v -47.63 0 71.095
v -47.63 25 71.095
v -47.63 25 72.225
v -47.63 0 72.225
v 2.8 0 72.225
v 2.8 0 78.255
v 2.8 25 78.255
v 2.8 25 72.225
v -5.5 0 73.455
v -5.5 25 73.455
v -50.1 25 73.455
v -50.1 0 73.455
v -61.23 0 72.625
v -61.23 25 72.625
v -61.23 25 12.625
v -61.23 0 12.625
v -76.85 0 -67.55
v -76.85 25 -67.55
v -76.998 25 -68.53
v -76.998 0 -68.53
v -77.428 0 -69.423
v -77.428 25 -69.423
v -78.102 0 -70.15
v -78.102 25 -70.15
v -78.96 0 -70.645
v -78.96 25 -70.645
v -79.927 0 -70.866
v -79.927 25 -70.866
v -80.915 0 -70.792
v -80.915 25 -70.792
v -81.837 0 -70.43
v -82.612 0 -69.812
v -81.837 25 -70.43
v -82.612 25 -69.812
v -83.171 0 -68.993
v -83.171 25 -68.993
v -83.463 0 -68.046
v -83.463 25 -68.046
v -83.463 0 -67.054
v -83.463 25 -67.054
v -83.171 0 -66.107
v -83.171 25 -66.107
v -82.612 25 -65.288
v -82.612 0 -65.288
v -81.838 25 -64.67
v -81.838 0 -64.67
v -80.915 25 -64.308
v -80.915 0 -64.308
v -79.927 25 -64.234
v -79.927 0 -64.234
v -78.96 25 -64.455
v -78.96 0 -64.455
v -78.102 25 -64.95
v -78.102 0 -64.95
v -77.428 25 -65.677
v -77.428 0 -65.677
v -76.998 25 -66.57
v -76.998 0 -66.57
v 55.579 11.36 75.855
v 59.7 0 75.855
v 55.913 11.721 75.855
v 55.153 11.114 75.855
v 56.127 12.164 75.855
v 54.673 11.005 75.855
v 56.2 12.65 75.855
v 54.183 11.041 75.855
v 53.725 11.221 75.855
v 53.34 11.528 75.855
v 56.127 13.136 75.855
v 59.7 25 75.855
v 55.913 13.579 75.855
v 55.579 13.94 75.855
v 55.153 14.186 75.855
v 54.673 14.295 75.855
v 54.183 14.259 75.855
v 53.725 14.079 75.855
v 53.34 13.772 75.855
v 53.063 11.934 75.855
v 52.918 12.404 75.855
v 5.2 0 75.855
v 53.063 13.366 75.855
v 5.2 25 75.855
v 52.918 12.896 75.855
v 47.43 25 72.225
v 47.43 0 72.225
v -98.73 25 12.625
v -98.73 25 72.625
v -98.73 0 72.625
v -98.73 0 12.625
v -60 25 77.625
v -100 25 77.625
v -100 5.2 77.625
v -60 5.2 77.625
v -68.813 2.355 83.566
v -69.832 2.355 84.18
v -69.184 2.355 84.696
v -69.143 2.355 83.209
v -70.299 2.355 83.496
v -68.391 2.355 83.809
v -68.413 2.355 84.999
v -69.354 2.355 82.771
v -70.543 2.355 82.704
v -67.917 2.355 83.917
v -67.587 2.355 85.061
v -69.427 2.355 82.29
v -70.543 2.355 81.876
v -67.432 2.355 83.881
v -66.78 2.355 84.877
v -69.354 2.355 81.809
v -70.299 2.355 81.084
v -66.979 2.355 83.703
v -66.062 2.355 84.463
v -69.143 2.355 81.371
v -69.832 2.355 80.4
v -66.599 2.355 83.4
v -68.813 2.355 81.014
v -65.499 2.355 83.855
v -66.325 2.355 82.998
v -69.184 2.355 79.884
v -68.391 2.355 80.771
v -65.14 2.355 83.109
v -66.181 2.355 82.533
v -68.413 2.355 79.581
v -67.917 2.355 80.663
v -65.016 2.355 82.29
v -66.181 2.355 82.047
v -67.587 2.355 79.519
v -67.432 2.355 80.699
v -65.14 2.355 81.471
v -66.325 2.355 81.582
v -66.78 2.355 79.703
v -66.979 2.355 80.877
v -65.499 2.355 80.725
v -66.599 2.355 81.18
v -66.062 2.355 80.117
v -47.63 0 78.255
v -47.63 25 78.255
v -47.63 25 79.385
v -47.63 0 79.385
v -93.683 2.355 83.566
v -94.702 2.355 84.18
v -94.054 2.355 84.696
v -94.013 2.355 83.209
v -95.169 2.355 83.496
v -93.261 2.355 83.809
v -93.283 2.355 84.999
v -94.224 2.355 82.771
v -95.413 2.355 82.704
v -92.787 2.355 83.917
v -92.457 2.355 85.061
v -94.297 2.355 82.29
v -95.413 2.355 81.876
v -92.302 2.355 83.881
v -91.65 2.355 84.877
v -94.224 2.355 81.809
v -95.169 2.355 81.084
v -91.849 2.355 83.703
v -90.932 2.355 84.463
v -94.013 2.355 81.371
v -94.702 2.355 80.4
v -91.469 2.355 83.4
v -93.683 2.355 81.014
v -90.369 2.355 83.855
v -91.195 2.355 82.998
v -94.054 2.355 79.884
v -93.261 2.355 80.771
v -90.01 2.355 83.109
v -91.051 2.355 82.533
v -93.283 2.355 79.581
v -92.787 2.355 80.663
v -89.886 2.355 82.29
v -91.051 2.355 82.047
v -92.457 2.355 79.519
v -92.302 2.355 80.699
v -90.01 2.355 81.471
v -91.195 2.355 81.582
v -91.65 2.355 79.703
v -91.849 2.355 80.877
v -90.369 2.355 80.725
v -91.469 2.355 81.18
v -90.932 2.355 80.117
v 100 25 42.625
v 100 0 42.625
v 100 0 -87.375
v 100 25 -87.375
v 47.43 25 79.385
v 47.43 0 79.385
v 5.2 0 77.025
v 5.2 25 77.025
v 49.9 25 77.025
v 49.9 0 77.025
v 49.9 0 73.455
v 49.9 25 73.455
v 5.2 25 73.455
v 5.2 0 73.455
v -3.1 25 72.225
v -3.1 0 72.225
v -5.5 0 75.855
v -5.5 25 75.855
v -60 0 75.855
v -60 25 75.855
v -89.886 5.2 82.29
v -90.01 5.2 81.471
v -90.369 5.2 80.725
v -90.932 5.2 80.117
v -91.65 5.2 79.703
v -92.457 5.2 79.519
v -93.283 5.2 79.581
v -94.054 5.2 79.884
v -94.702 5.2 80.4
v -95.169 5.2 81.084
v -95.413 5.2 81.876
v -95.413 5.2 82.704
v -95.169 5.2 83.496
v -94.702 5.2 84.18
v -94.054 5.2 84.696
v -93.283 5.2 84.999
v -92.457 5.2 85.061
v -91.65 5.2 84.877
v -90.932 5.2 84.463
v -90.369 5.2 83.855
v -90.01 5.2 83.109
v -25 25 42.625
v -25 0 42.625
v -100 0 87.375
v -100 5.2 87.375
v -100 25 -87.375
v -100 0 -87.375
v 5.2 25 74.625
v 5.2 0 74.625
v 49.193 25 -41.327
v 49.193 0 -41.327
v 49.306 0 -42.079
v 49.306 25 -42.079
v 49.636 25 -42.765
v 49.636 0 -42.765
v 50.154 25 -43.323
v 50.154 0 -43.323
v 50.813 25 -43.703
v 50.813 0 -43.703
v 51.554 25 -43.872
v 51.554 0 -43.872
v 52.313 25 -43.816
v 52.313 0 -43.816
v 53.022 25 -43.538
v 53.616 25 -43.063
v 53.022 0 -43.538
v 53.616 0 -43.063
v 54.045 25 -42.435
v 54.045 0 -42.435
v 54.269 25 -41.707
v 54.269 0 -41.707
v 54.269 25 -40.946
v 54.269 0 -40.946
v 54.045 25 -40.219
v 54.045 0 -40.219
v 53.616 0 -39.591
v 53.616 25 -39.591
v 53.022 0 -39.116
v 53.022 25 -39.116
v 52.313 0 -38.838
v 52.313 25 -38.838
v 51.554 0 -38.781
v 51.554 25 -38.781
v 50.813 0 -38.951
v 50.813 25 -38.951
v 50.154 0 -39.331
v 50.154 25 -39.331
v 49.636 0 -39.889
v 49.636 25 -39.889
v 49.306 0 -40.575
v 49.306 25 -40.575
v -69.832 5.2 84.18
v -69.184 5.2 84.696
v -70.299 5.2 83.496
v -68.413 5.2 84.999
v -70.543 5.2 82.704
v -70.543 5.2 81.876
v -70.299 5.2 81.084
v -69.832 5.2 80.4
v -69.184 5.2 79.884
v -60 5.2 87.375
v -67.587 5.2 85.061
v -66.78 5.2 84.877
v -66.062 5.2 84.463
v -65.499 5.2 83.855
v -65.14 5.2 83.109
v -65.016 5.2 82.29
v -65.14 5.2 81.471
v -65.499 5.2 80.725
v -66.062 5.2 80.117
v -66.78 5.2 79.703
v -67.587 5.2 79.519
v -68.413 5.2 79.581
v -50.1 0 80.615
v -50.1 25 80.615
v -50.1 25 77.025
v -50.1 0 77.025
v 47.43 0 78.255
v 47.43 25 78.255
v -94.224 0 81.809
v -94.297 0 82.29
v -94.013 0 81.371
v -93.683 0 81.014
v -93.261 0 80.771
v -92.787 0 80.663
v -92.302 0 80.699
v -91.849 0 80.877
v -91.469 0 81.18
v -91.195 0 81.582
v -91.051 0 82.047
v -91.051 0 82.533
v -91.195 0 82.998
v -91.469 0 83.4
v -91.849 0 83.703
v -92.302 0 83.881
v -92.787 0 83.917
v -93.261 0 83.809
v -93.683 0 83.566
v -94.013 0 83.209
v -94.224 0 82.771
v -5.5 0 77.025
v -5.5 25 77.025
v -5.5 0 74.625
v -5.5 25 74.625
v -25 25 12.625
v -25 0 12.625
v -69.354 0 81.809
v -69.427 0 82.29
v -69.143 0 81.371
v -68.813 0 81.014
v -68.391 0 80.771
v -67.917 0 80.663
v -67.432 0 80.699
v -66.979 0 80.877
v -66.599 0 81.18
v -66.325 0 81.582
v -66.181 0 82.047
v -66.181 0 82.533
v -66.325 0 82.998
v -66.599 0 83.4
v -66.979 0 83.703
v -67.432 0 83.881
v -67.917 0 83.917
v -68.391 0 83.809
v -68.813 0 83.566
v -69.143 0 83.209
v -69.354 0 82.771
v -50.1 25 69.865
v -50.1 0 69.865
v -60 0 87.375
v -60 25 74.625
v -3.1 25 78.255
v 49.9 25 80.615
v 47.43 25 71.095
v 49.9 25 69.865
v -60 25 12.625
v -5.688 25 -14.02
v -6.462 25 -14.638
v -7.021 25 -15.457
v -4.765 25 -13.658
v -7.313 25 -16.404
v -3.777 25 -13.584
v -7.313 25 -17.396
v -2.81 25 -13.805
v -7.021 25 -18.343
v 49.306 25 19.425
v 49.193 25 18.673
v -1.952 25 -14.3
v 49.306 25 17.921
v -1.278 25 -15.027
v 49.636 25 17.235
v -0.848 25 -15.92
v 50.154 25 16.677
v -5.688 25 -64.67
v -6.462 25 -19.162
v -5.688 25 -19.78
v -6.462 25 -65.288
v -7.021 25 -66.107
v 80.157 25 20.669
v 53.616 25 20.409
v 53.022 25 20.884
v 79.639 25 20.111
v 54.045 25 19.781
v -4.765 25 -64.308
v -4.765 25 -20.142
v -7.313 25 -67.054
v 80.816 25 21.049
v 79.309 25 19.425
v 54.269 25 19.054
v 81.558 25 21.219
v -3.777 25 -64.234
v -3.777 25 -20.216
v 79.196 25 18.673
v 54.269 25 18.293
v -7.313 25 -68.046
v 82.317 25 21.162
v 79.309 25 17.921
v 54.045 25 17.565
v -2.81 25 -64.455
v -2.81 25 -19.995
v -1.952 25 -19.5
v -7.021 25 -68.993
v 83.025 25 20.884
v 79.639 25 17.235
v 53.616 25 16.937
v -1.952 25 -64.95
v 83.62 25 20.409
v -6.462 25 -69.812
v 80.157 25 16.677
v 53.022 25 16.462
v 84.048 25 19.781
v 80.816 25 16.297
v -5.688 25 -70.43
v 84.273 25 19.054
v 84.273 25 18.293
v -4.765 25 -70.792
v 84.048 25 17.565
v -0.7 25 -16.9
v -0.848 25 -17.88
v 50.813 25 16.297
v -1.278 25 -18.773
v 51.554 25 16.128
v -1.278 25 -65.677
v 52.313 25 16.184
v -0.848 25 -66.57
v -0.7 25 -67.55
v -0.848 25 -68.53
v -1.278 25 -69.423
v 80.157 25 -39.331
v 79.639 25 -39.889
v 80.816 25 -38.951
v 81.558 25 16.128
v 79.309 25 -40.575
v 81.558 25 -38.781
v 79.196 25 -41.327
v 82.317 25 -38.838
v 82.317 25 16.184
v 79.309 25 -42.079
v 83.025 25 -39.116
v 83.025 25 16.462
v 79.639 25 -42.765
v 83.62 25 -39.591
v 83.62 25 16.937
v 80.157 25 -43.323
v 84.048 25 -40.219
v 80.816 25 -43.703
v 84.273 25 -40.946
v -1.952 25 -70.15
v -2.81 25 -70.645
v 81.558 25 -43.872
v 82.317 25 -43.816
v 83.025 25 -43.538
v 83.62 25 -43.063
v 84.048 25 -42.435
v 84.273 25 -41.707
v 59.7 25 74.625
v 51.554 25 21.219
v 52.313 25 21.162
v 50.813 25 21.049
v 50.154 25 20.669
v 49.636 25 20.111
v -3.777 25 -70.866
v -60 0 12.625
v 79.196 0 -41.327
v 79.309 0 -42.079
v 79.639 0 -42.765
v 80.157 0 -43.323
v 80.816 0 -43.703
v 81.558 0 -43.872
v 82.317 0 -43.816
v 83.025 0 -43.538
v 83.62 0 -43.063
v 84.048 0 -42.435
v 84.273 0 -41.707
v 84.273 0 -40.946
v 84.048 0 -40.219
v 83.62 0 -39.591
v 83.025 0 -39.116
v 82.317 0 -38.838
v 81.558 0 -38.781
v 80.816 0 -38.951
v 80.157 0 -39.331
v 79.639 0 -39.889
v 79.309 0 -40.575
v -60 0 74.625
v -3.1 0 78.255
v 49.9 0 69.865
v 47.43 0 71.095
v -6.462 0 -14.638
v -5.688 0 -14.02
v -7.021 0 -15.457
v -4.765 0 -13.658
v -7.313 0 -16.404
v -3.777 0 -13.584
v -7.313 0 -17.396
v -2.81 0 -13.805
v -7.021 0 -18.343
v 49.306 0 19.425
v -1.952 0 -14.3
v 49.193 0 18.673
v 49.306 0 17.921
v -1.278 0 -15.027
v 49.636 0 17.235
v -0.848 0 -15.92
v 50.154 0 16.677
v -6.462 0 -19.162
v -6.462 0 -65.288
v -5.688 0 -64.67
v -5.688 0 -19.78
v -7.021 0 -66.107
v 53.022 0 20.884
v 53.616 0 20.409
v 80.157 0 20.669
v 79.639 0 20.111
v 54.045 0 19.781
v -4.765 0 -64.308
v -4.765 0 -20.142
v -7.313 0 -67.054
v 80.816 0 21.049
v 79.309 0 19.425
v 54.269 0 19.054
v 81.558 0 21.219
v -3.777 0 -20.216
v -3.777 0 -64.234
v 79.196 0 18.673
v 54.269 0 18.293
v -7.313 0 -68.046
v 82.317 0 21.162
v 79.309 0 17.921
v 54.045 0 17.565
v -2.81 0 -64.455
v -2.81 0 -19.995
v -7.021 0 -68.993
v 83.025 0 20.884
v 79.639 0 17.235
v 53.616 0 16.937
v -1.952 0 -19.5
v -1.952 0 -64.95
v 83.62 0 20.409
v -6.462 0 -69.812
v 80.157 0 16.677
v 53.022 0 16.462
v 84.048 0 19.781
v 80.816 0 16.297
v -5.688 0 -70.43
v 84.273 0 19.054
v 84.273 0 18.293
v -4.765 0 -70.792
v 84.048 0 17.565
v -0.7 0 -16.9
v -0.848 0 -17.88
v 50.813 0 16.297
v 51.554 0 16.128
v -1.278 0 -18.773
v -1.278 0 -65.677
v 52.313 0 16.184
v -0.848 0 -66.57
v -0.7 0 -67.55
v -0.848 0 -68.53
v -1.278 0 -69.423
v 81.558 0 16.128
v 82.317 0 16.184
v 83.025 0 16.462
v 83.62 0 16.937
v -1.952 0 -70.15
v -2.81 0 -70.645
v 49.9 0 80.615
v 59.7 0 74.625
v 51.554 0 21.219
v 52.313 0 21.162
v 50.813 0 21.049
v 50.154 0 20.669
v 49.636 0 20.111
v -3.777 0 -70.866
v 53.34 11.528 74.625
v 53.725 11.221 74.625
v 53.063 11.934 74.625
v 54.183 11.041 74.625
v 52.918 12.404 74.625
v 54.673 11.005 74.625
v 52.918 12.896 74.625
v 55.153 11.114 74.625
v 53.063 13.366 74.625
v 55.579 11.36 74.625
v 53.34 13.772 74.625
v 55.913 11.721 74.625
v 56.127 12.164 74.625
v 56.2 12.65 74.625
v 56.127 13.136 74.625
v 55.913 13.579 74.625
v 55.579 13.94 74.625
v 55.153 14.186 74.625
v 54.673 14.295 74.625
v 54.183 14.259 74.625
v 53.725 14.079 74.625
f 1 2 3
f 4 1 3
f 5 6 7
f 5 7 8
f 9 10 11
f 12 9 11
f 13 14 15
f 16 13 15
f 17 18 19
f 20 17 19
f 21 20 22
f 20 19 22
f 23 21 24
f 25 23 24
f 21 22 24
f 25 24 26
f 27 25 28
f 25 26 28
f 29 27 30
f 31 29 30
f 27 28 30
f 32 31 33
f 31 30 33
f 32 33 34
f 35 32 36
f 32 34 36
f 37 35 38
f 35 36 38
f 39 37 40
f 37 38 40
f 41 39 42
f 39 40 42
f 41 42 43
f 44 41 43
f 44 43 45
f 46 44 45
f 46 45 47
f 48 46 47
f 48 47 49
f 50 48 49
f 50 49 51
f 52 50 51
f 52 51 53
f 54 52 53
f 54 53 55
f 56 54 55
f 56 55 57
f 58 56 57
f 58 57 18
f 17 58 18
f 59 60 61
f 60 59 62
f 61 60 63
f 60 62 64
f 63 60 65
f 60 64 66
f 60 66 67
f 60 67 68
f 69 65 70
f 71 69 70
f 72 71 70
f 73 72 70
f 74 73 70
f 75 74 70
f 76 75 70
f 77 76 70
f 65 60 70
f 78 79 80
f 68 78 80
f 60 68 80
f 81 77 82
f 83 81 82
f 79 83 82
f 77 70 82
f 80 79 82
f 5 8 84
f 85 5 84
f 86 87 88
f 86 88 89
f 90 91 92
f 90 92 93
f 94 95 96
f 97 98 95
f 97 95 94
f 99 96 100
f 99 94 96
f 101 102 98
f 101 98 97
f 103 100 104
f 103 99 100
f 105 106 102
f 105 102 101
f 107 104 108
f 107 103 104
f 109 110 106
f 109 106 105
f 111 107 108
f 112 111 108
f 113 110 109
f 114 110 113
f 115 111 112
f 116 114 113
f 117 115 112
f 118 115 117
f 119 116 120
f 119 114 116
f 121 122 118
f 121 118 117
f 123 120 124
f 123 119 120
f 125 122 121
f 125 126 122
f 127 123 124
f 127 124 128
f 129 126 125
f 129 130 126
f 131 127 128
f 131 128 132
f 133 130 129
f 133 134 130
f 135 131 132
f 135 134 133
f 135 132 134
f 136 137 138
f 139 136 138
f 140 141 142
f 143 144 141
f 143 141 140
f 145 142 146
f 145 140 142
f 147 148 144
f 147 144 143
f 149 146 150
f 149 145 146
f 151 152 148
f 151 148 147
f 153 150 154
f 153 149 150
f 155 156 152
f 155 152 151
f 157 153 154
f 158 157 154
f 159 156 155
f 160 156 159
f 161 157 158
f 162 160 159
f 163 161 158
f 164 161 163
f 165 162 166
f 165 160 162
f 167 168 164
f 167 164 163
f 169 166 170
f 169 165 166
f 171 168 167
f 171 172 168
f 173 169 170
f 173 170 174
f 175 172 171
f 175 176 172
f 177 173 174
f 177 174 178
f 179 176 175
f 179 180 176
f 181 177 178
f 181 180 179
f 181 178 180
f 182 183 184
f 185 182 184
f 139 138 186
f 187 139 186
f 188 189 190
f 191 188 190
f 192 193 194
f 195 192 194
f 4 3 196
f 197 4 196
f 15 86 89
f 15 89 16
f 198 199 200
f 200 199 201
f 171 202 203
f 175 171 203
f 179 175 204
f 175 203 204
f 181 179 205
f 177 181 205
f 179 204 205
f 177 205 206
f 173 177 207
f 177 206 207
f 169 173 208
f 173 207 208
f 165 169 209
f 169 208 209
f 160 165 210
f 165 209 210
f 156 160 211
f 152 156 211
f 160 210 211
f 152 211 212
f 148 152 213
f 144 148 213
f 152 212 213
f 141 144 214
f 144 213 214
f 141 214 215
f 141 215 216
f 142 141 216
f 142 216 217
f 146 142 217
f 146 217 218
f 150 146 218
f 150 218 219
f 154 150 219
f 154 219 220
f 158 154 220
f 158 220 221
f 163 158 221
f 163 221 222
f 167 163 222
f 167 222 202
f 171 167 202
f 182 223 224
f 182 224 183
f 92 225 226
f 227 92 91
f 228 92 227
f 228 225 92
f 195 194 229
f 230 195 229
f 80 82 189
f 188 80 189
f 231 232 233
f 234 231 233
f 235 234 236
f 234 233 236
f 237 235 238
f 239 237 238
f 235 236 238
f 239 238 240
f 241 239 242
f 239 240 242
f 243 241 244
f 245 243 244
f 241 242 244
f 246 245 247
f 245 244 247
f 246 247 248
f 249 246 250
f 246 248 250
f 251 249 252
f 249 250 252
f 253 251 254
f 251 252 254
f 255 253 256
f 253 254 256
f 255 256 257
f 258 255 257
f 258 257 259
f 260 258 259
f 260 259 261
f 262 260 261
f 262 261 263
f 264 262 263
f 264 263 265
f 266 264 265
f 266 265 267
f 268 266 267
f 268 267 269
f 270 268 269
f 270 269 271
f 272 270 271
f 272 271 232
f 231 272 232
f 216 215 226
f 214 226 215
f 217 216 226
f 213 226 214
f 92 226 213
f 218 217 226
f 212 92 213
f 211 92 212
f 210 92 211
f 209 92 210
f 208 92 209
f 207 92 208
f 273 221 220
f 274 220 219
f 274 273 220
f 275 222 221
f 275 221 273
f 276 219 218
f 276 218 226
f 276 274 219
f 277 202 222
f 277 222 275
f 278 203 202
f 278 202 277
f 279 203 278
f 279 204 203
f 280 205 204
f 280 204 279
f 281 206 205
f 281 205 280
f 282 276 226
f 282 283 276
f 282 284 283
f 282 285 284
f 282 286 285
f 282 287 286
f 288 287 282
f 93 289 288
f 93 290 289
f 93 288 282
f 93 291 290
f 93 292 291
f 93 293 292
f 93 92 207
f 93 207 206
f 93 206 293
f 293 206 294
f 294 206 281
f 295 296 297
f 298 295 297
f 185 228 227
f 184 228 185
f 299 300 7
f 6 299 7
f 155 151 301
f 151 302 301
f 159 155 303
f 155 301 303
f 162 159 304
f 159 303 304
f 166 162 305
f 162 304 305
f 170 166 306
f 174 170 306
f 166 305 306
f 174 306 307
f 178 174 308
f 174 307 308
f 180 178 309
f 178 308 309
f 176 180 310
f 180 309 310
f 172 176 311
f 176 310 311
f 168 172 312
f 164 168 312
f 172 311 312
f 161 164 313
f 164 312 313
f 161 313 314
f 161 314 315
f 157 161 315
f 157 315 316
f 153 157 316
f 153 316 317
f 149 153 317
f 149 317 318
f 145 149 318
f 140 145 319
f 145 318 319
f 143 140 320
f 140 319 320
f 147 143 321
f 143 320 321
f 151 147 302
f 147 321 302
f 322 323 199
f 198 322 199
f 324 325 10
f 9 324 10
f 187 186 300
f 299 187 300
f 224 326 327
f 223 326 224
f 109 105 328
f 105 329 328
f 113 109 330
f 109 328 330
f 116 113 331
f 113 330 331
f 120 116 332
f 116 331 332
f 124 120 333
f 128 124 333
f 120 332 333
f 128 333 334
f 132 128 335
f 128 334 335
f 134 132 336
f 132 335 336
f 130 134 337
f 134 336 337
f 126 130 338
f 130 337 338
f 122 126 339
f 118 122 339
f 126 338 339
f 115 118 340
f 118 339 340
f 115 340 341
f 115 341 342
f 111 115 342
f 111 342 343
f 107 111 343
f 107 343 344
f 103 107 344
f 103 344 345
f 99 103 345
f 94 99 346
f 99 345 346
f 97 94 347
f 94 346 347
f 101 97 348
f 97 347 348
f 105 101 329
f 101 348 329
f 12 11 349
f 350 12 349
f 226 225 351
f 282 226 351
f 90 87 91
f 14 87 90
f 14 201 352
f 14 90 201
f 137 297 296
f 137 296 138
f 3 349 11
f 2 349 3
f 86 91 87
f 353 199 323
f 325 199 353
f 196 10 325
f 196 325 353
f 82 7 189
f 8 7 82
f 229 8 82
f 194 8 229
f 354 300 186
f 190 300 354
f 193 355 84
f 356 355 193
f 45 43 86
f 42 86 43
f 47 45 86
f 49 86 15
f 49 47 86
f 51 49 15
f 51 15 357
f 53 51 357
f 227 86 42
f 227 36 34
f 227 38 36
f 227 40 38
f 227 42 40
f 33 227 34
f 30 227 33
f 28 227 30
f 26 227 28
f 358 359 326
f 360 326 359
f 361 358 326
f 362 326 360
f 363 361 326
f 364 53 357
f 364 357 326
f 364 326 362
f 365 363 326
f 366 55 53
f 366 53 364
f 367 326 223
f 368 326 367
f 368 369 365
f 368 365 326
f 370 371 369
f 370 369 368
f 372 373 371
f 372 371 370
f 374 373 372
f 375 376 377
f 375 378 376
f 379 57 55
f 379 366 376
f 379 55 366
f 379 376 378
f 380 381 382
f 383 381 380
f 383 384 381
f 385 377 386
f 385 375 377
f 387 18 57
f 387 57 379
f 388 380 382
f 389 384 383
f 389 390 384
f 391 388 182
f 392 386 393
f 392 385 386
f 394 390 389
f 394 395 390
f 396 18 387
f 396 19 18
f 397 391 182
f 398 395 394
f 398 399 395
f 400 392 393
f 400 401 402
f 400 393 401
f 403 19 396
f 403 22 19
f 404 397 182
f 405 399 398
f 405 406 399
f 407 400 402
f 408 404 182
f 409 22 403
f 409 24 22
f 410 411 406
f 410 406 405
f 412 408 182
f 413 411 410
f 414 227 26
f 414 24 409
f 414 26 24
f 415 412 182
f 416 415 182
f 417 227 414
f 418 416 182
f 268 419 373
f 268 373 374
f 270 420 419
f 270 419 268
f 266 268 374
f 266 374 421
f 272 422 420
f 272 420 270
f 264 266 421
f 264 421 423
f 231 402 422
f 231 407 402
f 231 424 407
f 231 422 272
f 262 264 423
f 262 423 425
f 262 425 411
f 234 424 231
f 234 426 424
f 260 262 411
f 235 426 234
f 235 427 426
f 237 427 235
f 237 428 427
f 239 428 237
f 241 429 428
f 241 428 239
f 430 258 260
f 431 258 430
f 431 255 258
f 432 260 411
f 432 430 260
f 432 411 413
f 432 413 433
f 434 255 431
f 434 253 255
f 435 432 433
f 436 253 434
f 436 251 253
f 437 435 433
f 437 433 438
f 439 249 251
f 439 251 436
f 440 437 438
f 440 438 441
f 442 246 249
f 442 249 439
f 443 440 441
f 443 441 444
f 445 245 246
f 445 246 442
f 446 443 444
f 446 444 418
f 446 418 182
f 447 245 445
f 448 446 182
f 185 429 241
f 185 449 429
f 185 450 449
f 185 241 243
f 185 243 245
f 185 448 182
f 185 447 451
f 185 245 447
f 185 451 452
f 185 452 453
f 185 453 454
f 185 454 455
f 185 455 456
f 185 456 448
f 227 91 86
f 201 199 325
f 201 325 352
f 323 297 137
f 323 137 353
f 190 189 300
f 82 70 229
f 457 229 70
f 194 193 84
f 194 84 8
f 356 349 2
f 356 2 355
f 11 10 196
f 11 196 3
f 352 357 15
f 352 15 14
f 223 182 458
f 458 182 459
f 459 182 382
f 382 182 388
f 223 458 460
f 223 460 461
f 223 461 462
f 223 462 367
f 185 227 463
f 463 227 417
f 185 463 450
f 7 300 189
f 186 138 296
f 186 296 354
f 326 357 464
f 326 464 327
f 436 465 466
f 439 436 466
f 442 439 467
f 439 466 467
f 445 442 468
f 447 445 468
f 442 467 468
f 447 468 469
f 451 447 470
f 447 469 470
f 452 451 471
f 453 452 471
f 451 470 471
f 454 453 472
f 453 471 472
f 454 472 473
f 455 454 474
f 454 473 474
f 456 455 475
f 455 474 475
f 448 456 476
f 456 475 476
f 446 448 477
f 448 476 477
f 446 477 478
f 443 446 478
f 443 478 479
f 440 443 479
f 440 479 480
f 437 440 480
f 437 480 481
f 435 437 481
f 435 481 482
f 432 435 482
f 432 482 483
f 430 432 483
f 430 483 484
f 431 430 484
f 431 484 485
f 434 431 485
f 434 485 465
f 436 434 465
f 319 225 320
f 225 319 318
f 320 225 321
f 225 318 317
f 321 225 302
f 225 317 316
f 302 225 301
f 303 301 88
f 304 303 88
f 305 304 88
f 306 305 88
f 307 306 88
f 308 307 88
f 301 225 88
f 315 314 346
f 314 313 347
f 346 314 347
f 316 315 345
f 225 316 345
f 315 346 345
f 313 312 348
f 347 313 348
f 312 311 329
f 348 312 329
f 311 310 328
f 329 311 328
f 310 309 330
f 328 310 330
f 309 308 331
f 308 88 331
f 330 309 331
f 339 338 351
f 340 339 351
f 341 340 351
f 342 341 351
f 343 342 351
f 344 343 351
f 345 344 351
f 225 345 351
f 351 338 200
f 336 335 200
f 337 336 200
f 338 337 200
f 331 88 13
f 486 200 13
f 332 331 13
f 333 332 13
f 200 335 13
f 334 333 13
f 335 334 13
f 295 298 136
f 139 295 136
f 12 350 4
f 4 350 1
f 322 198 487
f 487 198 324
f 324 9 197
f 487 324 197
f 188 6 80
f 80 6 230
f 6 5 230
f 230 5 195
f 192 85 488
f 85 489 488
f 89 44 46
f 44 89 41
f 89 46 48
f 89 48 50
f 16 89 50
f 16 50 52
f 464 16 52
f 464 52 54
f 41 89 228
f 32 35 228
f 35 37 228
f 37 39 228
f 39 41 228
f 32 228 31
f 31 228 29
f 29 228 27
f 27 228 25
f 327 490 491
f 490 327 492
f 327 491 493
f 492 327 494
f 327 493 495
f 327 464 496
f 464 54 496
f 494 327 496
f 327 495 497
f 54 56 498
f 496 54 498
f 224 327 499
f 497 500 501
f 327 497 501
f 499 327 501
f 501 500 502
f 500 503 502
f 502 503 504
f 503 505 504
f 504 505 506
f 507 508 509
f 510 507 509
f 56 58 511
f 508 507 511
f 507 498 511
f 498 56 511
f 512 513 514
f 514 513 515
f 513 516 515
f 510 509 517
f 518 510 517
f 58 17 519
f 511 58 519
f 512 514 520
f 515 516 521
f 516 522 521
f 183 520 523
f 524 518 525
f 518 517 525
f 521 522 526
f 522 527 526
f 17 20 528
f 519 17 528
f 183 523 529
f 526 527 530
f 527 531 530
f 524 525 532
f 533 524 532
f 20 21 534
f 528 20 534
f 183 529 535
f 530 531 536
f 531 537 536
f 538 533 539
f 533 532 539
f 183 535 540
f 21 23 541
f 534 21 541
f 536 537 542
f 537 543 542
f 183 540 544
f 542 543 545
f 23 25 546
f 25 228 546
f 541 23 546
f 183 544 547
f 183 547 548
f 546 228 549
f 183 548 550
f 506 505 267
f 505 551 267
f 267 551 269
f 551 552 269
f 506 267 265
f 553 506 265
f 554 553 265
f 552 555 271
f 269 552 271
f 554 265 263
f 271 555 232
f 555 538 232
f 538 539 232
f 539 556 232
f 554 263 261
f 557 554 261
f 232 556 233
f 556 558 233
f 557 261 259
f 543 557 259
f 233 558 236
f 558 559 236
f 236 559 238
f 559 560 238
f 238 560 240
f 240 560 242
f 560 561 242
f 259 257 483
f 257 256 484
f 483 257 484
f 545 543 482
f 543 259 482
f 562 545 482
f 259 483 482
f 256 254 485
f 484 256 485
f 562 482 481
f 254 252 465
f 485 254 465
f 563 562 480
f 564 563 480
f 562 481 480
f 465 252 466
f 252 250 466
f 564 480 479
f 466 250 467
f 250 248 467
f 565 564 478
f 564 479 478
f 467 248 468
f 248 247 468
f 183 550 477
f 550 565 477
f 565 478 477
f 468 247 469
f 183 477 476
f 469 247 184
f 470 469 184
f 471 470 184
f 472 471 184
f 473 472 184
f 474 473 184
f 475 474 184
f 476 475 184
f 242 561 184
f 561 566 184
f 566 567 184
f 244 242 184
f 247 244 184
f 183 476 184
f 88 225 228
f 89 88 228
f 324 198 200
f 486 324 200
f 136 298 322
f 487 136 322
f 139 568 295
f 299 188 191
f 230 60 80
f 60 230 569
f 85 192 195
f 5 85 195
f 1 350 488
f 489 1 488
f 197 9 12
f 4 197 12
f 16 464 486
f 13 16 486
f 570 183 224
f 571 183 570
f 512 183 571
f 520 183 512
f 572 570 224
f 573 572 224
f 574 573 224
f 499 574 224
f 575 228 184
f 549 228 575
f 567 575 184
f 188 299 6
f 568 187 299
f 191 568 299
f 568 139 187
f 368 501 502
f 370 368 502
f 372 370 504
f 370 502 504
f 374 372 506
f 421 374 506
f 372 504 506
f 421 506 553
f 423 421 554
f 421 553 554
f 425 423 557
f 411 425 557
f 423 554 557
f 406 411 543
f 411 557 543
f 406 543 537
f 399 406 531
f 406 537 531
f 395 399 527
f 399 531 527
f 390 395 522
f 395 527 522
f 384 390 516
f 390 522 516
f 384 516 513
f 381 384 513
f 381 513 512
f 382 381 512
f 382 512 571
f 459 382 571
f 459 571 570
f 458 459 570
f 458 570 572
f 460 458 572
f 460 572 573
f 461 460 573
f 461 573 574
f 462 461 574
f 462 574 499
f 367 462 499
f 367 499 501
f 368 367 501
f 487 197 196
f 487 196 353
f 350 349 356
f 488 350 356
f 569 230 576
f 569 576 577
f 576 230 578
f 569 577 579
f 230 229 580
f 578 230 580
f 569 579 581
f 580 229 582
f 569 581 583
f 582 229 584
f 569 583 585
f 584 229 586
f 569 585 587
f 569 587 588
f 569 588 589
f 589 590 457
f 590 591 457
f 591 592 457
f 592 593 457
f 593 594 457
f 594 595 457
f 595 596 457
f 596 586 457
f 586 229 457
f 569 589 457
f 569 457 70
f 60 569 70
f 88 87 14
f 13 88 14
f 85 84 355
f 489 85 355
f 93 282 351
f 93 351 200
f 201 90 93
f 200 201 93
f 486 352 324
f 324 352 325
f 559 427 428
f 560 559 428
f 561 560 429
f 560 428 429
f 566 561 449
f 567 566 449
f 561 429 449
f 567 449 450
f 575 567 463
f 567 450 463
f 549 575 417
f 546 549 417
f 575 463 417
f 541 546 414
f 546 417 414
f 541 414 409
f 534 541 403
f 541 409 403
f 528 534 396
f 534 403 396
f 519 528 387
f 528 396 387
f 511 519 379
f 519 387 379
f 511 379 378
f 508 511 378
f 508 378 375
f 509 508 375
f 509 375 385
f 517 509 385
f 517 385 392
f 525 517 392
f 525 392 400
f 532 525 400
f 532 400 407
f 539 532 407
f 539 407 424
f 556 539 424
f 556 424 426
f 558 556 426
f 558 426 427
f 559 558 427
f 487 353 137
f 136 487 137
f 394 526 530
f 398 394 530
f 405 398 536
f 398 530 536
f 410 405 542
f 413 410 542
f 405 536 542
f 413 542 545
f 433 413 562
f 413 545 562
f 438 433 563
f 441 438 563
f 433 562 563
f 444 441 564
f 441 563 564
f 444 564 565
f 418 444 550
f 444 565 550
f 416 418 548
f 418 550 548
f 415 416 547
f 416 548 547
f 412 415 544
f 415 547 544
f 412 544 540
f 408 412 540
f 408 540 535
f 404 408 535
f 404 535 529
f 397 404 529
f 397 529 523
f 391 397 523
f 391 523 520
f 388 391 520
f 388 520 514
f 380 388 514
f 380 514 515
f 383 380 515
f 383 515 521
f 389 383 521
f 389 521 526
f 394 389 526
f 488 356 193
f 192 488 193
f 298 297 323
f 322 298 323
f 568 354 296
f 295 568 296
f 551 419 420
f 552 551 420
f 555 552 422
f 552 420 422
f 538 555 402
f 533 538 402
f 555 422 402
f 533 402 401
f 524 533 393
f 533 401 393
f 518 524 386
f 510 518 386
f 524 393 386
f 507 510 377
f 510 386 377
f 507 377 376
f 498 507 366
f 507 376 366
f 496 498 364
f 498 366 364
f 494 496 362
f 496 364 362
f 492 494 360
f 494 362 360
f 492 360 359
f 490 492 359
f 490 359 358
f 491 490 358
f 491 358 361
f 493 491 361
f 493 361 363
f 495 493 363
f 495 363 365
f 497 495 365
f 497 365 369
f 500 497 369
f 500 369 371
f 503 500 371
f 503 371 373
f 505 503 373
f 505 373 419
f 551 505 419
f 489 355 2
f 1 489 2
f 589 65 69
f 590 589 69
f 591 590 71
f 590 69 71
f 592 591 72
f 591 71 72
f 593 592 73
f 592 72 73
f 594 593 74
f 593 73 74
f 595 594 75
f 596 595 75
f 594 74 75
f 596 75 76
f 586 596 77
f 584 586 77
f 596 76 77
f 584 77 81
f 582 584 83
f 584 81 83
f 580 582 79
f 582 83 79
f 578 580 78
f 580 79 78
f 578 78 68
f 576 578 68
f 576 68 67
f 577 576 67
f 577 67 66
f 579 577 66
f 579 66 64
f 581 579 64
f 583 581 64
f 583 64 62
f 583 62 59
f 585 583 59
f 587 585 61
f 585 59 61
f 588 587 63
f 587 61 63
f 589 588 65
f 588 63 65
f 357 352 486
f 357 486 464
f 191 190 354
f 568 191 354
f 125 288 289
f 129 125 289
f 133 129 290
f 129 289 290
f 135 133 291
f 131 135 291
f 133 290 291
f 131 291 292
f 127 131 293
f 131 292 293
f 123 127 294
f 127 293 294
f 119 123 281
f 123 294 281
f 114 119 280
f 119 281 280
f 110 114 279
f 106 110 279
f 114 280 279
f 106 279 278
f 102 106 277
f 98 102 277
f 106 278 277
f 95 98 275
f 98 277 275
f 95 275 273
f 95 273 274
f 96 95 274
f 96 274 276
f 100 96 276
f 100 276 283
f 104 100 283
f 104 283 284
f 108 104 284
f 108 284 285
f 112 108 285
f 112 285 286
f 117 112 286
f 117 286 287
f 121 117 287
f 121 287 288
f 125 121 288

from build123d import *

# Parameters (mm, degrees)
SKETCH1_W                                      = 200
SKETCH1_H                                      = 174.75
BOSS_EXTRUDE1_DEPTH                            = 25
SKETCH2_W                                      = 40
SKETCH2_H                                      = 9.75
CUT_EXTRUDE1_DEPTH                             = 19.8
SKETCH3_W                                      = 37.5
SKETCH3_H                                      = 60
CUT_EXTRUDE2_DEPTH                             = 26
BOSS_EXTRUDE2_DEPTH                            = 25
SKETCH5_R                                      = 1.65
CUT_EXTRUDE3_DEPTH                             = 1.23
SKETCH6_R                                      = 3.325
CUT_EXTRUDE4_DEPTH                             = 26
SKETCH7_R                                      = 0.685
CUT_EXTRUDE5_DEPTH                             = 6.2
F_1_4_20_TAPPED_HOLE1_D                        = 5.1054
CBORE_FOR_4_SOCKET_HEAD_CAP_SCREW1_D           = 3.2639
CBORE_FOR_4_SOCKET_HEAD_CAP_SCREW1_CBORE_D     = 5.55752
CBORE_FOR_4_SOCKET_HEAD_CAP_SCREW1_CBORE_DEPTH = 2.8448


with BuildPart() as part:
    # Sketch1 → Boss-Extrude1 (new body)
    with BuildSketch(Plane(origin=(0, 0, 0), x_dir=(1, 0, 0), z_dir=(0, 1, 0))):
        Rectangle(SKETCH1_W, SKETCH1_H)
    extrude(amount=BOSS_EXTRUDE1_DEPTH)

    # Sketch2 → Cut-Extrude1 (cut)
    with BuildSketch(Plane(origin=(0, 25, 0), x_dir=(1, 0, 0), z_dir=(0, 1, 0))):
        with Locations((-80, -82.5)):
            Rectangle(SKETCH2_W, SKETCH2_H)
    extrude(amount=-CUT_EXTRUDE1_DEPTH, mode=Mode.SUBTRACT)

    # Sketch3 → Cut-Extrude2 (cut, through all)
    with BuildSketch(Plane(origin=(0, 25, 0), x_dir=(1, 0, 0), z_dir=(0, 1, 0))):
        with Locations((-79.98, -42.625)):
            Rectangle(SKETCH3_W, SKETCH3_H)
        Polygon((-25, -42.625), (100, -42.625), (100, -87.375), (-60, -87.375), (-60, -12.625), (-25, -12.625), align=None)
    extrude(amount=-CUT_EXTRUDE2_DEPTH, mode=Mode.SUBTRACT)

    # Sketch4 → Boss-Extrude2 (add)
    with BuildSketch(Plane(origin=(0, 25, 0), x_dir=(1, 0, 0), z_dir=(0, 1, 0))):
        Polygon((-60, -74.625), (-5.5, -74.625), (-5.5, -73.455), (-50.1, -73.455), (-50.1, -69.865), (49.9, -69.865), (49.9, -73.455), (5.2, -73.455), (5.2, -74.625), (59.7, -74.625), (59.7, -75.855), (5.2, -75.855), (5.2, -77.025), (49.9, -77.025), (49.9, -80.615), (-50.1, -80.615), (-50.1, -77.025), (-5.5, -77.025), (-5.5, -75.855), (-60, -75.855), align=None)
        Polygon((-3.1, -72.225), (-3.1, -78.255), (-47.63, -78.255), (-47.63, -79.385), (47.43, -79.385), (47.43, -78.255), (2.8, -78.255), (2.8, -72.225), (47.43, -72.225), (47.43, -71.095), (-47.63, -71.095), (-47.63, -72.225), align=None, mode=Mode.SUBTRACT)
    extrude(amount=-BOSS_EXTRUDE2_DEPTH)

    # Sketch5 → Cut-Extrude3 (cut)
    with BuildSketch(Plane.XY.offset(75.855)):
        with Locations((54.55, 12.65)):
            Circle(SKETCH5_R)
    extrude(amount=-CUT_EXTRUDE3_DEPTH, mode=Mode.SUBTRACT)

    # Sketch6 → Cut-Extrude4 (cut, through all)
    with BuildSketch(Plane(origin=(0, 25, 0), x_dir=(1, 0, 0), z_dir=(0, 1, 0))):
        with Locations((-80.175, 67.55)):
            Circle(SKETCH6_R)
        with Locations((-4.025, 67.55)):
            Circle(SKETCH6_R)
        with Locations((-4.025, 16.9)):
            Circle(SKETCH6_R)
    extrude(amount=-CUT_EXTRUDE4_DEPTH, mode=Mode.SUBTRACT)

    # Sketch7 → Cut-Extrude5 (cut, through all)
    with BuildSketch(Plane(origin=(0, 5.2, 0), x_dir=(1, 0, 0), z_dir=(0, 1, 0))):
        with Locations((-92.665, -82.29)):
            Circle(SKETCH7_R)
        with Locations((-67.795, -82.29)):
            Circle(SKETCH7_R)
    extrude(amount=-CUT_EXTRUDE5_DEPTH, mode=Mode.SUBTRACT)

    # 1/4-20 Tapped Hole1 (through all)
    with Locations(Plane(origin=(0, 25, 0), x_dir=(1, 0, 0), z_dir=(0, 1, 0))):
        with Locations((51.745235504, 41.326927492), (81.748513239, 41.326927492), (81.748513239, -18.673072418), (51.745235504, -18.673072418)):
            Hole(F_1_4_20_TAPPED_HOLE1_D / 2)

    # CBORE for #4 Socket Head Cap Screw1 (through all)
    with Locations(Plane(origin=(0, 5.2, 0), x_dir=(1, 0, 0), z_dir=(0, 1, 0))):
        with Locations((-92.665, -82.29), (-67.795, -82.29)):
            CounterBoreHole(CBORE_FOR_4_SOCKET_HEAD_CAP_SCREW1_D / 2, CBORE_FOR_4_SOCKET_HEAD_CAP_SCREW1_CBORE_D / 2, CBORE_FOR_4_SOCKET_HEAD_CAP_SCREW1_CBORE_DEPTH)


solid = part.part
